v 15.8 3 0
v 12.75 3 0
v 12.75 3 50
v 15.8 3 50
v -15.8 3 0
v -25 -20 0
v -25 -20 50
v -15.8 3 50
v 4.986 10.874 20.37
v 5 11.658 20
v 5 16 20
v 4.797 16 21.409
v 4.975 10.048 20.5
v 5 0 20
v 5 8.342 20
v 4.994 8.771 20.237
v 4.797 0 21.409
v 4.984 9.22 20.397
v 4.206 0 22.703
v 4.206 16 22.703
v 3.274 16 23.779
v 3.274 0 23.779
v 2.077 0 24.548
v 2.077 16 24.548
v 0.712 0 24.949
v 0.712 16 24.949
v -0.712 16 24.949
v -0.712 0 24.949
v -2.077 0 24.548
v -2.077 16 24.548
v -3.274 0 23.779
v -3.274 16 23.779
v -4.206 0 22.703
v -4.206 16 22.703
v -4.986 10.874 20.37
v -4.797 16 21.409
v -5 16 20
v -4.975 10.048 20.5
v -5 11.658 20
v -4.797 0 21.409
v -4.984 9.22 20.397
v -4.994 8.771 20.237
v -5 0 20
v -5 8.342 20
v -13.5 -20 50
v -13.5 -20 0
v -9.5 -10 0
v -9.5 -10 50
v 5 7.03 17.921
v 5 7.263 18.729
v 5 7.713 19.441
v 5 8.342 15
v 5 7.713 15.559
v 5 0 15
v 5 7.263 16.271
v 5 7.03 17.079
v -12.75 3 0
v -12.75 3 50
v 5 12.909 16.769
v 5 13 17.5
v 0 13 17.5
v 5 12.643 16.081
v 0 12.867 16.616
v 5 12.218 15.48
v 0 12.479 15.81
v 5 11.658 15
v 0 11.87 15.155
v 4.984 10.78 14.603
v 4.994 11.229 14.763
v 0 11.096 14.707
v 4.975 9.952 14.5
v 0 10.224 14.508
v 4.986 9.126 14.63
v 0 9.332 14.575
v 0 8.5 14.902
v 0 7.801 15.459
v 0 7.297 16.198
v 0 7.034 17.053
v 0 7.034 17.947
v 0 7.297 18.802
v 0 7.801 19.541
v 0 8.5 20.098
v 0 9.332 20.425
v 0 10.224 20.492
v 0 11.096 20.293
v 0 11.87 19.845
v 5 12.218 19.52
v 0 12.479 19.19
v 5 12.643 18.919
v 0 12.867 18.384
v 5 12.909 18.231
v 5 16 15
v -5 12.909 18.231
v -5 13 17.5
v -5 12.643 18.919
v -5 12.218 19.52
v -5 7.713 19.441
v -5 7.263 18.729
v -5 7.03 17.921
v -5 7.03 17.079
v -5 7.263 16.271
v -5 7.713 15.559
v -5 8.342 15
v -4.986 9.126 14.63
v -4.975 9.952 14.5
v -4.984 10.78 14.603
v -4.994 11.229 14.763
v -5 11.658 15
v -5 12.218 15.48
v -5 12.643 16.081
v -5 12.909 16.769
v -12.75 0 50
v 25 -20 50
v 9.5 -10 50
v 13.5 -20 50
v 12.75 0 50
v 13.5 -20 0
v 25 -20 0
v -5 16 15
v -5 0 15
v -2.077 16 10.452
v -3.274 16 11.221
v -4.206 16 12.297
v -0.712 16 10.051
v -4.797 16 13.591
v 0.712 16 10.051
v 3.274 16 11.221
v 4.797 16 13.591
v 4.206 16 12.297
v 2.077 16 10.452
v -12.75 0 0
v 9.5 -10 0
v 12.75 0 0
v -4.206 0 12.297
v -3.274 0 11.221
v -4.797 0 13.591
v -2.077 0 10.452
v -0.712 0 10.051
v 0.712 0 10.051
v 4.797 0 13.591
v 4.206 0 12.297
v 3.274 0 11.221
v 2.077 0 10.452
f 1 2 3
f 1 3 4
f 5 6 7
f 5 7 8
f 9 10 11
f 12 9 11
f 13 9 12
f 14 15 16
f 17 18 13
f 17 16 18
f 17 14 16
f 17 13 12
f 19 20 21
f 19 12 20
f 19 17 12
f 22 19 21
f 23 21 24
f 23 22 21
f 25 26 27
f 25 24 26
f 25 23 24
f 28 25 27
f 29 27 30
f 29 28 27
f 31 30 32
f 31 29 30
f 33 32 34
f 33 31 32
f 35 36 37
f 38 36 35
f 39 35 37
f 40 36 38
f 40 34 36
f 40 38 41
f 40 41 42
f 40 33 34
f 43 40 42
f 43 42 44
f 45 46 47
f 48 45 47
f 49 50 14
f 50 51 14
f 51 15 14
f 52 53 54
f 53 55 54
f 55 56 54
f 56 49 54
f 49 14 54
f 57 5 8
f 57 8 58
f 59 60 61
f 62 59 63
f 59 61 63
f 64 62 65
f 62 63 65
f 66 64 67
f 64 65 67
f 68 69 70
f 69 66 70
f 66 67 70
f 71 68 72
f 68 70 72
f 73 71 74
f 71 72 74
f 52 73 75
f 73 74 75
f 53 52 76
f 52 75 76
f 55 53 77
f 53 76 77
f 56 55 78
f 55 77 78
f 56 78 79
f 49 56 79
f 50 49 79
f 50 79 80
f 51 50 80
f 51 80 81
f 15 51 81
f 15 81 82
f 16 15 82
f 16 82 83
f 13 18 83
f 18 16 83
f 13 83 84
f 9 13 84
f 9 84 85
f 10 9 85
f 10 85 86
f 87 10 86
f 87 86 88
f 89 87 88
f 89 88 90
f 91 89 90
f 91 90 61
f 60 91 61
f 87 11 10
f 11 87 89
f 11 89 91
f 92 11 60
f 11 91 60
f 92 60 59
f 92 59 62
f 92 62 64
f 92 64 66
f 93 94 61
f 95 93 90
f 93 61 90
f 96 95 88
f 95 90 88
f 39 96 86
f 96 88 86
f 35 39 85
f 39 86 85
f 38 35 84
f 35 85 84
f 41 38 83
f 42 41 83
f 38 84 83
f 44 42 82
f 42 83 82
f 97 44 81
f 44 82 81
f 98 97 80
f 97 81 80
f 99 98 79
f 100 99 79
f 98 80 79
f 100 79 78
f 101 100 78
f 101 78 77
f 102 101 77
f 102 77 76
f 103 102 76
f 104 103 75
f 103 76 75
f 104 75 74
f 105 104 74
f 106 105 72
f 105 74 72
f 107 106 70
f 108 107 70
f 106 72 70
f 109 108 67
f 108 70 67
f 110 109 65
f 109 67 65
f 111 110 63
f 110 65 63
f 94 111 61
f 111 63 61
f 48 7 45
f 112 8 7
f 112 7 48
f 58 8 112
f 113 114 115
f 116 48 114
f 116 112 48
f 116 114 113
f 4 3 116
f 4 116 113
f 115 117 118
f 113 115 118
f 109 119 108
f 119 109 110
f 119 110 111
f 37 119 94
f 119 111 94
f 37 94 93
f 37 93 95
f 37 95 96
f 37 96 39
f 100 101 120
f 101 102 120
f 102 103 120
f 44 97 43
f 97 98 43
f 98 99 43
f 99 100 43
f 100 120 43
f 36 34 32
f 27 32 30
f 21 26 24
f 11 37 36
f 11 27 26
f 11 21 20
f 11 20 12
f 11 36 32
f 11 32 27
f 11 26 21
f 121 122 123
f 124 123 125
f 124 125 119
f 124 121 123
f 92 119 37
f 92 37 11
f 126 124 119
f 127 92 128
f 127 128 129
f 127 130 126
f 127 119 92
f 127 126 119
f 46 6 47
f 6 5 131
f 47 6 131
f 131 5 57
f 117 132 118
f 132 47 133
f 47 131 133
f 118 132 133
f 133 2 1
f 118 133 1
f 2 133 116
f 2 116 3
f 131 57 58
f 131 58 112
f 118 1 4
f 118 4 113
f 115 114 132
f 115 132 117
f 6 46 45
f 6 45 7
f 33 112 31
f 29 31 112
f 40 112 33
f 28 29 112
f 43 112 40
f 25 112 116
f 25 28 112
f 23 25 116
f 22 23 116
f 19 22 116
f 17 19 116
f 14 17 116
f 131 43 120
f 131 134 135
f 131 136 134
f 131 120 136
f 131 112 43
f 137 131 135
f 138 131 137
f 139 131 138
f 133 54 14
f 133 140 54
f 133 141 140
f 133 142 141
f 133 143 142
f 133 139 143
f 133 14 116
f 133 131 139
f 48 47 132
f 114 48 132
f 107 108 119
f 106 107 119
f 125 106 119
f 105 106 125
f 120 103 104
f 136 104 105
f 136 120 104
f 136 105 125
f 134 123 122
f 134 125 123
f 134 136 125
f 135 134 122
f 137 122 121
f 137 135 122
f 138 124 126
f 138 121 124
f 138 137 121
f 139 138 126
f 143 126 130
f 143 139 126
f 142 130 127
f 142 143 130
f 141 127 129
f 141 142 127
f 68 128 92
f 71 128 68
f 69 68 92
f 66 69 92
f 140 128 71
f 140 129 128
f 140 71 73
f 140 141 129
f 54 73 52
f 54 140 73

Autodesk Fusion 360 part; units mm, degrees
sketch "スケッチ2" plane through (0, 0, 0) normal (0, 0, 1) x (1, 0, 0)
  line L0 (15.8, 3) -> (25, -20)
  line L1 (-25, -20) -> (-15.8, 3)
  line L2 (-13.5, -20) -> (-9.5, -10)
  line L3 (-9.5, -10) -> (9.5, -10)
  line L4 (9.5, -10) -> (13.5, -20)
  line L5 (13.5, -20) -> (25, -20)
  line L6 (-13.5, -20) -> (-25, -20)
  line L7 (-15.8, 3) -> (-12.75, 3)
  line L8 (-12.75, 3) -> (-12.75, 0)
  line L9 (-12.75, 0) -> (12.75, 0)
  line L10 (12.75, 0) -> (12.75, 3)
  line L11 (12.75, 3) -> (15.8, 3)
  dimension "d1" = 19
  dimension "d2" = 9.5
  dimension "d5" = 13
  dimension "d6" = 10
  dimension "d7" = 25.5
  dimension "d8" = 3
  dimension "d9" = 11.5
  dimension "d24" = 25
  dimension "d25" = 12.75
  dimension "d26" = 20
extrude "押し出し1" add sketch "スケッチ2" along normal blind 50
sketch "スケッチ3" plane through (0, 0, 0) normal (0, 1, 0) x (1, 0, 0)
  line L0 (5, -20) -> (5, -15)
  arc A0 (5, -15) -> (-5, -15) centre (0, -15) ccw
  line L1 (-5, -15) -> (-5, -20)
  arc A1 (-5, -20) -> (5, -20) centre (0, -20) ccw
  line L2 (0, -20) -> (0, -15) construction
  dimension "d16" = 5
  dimension "d17" = 5
extrude "押し出し2" add sketch "スケッチ3" along normal blind 16
sketch "スケッチ6" plane through (0, 0, 0) normal (1, 0, 0) x (0, 1, 0)
  circle A0 centre (10, 17.5) radius 3
  line L0 (0, 0) -> (0, 50)
  dimension "d21" = 6
  dimension "d22" = 10
extrude "押し出し4" cut sketch "スケッチ6" along normal through all and the other way through all
